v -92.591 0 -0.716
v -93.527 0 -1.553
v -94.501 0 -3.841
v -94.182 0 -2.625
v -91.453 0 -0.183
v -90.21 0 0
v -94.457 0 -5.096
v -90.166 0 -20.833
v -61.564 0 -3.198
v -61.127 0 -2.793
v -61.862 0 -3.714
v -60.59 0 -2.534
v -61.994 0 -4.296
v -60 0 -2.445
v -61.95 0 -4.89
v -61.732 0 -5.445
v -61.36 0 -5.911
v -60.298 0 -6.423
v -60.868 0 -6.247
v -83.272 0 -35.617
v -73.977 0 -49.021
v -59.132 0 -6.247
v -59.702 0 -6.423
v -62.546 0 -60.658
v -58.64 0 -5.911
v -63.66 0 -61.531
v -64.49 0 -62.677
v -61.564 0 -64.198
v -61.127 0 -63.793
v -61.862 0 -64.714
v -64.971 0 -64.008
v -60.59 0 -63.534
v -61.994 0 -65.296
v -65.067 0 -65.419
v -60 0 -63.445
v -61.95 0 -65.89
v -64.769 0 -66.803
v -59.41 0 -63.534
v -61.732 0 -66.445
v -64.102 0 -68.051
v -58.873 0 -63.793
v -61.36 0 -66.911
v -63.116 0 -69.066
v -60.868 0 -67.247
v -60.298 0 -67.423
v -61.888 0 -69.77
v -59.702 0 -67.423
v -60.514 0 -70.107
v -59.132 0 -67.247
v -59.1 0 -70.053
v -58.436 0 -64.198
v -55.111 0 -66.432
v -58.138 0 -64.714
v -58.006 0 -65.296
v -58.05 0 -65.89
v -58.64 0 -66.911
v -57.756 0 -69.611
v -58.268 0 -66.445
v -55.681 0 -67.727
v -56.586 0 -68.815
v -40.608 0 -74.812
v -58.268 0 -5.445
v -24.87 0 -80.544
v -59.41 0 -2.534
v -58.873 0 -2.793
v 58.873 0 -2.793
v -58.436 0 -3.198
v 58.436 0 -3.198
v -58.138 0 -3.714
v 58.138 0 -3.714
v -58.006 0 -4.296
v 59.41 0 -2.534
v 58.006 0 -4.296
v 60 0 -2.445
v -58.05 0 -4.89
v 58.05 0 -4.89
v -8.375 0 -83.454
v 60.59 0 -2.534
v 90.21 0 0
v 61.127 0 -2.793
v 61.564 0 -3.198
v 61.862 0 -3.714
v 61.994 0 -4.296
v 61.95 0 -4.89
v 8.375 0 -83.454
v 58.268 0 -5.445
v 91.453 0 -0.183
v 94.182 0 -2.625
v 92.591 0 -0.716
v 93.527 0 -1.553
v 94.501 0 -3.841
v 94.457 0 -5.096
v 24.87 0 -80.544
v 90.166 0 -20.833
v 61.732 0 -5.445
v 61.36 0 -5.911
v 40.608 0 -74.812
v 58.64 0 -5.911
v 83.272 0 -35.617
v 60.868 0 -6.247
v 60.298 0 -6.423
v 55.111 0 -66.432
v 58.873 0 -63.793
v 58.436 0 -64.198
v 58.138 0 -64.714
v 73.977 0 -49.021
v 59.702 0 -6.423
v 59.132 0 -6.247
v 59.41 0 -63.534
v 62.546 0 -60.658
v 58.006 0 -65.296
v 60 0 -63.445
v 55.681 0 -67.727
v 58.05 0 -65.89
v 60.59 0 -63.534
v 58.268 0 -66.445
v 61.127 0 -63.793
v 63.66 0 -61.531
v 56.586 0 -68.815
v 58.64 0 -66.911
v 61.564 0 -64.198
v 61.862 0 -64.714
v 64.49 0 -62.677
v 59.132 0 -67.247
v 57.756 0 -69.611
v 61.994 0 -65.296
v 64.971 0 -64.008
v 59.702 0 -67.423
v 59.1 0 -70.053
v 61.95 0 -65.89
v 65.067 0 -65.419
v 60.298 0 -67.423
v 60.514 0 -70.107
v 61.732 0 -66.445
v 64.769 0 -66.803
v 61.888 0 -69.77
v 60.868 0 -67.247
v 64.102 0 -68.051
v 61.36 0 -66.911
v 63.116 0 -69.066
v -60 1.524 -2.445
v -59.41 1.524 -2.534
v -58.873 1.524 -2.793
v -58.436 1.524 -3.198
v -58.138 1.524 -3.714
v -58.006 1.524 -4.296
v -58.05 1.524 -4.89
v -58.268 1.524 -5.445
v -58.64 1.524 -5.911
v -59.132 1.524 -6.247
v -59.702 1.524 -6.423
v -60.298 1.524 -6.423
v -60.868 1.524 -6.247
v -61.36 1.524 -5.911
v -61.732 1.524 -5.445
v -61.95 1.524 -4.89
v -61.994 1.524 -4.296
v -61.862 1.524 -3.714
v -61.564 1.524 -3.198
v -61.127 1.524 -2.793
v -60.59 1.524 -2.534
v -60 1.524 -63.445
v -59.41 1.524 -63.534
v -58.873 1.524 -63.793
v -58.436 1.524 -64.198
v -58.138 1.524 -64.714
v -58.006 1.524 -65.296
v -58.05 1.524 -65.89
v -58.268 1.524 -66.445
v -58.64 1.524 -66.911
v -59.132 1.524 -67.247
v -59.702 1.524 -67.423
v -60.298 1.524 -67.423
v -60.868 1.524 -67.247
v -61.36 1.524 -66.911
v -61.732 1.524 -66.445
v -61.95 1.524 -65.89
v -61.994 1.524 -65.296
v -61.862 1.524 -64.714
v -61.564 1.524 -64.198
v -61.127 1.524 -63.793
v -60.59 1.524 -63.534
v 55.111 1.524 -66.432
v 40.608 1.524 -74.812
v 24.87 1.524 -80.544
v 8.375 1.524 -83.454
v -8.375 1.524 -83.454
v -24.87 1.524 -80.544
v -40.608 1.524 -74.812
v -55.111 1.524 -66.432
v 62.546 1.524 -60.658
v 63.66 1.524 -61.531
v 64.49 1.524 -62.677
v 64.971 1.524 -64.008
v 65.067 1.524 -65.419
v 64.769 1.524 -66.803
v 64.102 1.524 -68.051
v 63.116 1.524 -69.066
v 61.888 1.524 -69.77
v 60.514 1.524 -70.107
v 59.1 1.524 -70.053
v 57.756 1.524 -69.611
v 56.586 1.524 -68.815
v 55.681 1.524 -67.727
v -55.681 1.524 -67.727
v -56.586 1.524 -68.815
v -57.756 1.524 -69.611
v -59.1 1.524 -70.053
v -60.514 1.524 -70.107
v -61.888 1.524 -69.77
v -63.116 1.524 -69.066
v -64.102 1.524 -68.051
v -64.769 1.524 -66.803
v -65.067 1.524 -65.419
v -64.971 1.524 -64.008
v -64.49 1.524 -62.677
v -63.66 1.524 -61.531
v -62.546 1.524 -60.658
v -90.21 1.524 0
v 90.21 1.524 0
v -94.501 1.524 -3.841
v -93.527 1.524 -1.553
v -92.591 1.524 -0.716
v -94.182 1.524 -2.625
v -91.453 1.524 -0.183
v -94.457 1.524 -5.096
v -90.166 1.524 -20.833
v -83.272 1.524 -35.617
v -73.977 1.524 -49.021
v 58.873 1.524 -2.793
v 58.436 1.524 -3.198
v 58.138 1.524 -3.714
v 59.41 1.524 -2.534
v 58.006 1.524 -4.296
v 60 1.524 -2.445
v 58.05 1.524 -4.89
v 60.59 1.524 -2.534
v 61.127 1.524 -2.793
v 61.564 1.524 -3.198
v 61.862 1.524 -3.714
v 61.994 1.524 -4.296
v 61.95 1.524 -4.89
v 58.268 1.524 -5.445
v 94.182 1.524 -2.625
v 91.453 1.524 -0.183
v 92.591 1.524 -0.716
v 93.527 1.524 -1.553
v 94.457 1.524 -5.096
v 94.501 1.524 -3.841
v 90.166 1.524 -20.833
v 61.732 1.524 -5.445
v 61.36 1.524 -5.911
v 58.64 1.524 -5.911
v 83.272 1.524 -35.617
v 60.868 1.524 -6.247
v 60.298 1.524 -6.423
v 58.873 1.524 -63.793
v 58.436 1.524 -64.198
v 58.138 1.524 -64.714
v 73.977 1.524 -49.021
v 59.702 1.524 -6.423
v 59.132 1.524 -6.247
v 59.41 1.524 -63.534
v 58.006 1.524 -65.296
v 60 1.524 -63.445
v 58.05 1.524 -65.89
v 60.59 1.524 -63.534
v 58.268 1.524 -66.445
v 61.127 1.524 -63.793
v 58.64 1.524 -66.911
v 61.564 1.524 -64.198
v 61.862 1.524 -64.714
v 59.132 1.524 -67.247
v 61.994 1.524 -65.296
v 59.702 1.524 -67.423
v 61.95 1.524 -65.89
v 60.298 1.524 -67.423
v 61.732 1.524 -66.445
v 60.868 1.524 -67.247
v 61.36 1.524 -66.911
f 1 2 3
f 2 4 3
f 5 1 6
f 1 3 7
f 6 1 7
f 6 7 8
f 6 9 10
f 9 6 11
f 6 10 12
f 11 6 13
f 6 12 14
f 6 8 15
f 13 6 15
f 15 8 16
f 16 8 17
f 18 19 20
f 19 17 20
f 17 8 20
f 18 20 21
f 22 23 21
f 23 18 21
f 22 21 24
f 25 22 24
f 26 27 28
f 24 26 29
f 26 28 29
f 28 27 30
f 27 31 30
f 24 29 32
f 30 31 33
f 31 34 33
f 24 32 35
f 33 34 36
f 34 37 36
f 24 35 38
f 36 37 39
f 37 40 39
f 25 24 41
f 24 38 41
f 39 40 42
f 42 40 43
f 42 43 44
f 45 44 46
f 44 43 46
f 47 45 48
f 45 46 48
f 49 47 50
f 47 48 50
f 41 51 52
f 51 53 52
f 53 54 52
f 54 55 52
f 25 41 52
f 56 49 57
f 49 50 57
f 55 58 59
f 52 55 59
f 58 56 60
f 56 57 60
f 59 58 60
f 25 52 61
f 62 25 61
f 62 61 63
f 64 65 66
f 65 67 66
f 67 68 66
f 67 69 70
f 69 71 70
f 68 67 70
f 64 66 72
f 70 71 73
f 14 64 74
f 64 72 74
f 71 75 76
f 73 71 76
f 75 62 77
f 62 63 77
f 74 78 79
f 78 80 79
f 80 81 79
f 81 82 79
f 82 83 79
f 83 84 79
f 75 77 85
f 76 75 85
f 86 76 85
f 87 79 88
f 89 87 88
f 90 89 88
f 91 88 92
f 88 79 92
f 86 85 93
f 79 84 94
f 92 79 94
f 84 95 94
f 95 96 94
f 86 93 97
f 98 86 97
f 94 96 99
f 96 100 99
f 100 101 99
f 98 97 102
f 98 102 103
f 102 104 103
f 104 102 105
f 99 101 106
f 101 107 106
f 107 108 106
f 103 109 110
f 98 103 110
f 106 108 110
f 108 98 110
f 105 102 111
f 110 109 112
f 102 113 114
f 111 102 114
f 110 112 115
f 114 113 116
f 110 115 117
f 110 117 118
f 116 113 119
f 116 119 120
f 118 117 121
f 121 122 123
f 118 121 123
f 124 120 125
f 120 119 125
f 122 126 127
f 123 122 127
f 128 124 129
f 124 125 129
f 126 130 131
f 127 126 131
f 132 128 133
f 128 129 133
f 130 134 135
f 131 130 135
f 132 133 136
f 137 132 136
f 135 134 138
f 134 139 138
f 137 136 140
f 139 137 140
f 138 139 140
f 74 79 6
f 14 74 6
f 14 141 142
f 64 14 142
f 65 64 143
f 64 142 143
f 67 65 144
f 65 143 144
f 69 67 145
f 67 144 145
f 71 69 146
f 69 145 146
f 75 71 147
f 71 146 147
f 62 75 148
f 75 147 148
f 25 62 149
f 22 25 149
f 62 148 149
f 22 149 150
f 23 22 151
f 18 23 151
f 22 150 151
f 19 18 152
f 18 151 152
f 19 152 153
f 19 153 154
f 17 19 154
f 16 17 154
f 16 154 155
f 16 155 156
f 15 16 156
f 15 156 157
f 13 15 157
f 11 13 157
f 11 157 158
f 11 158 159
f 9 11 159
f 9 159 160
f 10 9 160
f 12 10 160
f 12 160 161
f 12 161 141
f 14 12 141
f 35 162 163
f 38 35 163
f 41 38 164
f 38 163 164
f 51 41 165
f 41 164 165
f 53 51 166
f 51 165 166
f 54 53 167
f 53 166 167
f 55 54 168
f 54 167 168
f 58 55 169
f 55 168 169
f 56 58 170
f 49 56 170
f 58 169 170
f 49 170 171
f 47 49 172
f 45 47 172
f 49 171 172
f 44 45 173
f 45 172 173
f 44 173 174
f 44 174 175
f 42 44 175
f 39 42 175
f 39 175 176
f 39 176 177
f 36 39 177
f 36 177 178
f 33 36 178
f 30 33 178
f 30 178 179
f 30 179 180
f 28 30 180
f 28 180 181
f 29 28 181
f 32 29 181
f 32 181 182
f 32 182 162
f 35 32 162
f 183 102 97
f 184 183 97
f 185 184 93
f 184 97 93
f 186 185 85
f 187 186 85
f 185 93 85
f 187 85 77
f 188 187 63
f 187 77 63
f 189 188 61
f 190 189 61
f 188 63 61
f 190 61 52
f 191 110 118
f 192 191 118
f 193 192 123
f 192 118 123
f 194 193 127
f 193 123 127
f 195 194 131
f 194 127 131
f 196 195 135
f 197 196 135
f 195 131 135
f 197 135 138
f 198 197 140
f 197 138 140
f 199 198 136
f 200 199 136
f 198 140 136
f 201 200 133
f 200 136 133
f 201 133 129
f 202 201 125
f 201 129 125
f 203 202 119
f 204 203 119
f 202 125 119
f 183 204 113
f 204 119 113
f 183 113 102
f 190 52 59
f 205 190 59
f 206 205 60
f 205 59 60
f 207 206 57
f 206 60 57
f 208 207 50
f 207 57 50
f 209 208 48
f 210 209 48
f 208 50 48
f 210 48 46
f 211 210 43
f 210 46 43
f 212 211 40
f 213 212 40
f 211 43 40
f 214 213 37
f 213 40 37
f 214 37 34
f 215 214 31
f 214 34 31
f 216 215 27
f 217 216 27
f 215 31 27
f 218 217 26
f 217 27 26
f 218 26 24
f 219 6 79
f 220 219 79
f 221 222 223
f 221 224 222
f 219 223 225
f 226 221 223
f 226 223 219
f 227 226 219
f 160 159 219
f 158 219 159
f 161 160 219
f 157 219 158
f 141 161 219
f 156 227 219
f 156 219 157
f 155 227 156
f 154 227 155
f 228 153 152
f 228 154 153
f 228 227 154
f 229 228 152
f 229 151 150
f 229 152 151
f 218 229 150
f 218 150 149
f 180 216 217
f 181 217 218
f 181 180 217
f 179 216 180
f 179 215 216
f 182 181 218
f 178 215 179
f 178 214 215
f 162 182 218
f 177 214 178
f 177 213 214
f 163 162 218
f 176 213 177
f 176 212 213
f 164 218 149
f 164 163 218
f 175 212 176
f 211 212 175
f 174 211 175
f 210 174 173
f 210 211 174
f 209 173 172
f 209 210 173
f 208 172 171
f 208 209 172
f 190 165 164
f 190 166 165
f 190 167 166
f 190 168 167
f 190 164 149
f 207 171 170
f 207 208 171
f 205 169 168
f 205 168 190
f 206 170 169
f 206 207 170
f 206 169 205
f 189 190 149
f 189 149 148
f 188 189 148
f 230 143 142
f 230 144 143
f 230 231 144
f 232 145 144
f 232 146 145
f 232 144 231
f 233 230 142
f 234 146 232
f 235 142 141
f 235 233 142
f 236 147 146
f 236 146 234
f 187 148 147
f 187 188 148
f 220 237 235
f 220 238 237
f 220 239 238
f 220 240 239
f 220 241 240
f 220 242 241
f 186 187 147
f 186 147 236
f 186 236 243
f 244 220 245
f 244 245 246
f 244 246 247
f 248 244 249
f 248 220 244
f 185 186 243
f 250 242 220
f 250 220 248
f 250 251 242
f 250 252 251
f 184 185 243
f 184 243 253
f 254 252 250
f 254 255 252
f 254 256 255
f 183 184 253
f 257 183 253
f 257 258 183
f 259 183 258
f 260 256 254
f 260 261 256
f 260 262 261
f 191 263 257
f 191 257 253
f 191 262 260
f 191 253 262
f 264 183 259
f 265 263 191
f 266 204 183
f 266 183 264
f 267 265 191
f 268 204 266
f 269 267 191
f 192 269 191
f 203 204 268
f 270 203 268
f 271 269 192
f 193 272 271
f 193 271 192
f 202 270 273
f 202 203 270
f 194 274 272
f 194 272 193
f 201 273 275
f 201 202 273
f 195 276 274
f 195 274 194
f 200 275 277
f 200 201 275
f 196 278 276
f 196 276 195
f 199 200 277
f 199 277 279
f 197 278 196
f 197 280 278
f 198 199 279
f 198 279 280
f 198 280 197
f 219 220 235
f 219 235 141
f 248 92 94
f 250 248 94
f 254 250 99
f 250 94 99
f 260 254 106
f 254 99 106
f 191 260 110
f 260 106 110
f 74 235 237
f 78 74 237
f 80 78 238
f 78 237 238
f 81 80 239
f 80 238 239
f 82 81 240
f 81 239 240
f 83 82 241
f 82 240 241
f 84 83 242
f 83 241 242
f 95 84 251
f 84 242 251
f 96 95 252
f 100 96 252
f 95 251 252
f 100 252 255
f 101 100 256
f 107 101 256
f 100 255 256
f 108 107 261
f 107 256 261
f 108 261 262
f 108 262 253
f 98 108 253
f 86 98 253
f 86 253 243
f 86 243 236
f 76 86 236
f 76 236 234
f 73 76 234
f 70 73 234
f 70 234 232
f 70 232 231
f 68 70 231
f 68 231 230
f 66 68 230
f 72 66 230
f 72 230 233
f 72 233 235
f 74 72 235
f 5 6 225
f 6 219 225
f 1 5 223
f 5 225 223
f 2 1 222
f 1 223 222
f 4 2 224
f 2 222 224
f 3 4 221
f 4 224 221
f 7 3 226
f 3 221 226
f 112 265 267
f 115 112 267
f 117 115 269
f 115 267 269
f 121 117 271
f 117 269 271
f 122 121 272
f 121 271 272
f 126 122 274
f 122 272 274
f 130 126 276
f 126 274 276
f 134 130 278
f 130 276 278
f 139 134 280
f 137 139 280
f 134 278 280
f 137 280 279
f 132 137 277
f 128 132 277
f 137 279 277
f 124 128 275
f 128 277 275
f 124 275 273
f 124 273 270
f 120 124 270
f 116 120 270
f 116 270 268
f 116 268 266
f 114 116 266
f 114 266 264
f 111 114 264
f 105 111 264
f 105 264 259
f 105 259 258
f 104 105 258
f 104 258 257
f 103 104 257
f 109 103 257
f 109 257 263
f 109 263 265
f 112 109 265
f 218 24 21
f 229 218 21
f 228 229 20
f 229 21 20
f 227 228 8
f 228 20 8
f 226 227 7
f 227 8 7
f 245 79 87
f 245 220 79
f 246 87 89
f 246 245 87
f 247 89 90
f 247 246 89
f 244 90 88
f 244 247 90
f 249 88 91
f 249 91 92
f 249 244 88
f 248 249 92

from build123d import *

# Parameters (mm, degrees)
BOSS_EXTRU_1_DEPTH      = 1.524
CONG_1_R                = 4.318
BOSS_EXTRU_3_START      = -1.524
BOSS_EXTRU_3_DEPTH      = 1.524
ESQUISSE3_R             = 2
ENL_V_MAT_EXTRU_1_DEPTH = 127.347243097


with BuildPart() as part:
    # Esquisse1 → Boss.-Extru.1 (new body)
    with BuildSketch(Plane(origin=(0, 0, 0), x_dir=(1, 0, 0), z_dir=(0, 1, 0))):
        with BuildLine():
            Line((-95.25, 0), (95.25, 0))
            ThreePointArc((95.25, 0), (0, 83.82), (-95.25, 0))
        make_face()
    extrude(amount=BOSS_EXTRU_1_DEPTH)

    # Congé1
    cong_1_edges = [part.edges().sort_by_distance(p)[0] for p in [
        (-95.25, 0.762, 0),
        (95.25, 0.762, 0),
    ]]
    fillet(cong_1_edges, radius=CONG_1_R)

    # Esquisse2 → Boss.-Extru.3 (add)
    with BuildSketch(Plane(origin=(0, 1.524, 0), x_dir=(1, 0, 0), z_dir=(0, 1, 0)).offset(BOSS_EXTRU_3_START)):
        with BuildLine():
            ThreePointArc((62.546228877, 60.657678488), (63.115798852, 69.065741324), (55.110603719, 66.431964286))
            ThreePointArc((55.110603719, 66.431964286), (58.899220354, 63.635996718), (62.546228877, 60.657678488))
        make_face()
        with BuildLine():
            ThreePointArc((-62.546228877, 60.657678488), (-58.899220354, 63.635996718), (-55.110603719, 66.431964286))
            ThreePointArc((-55.110603719, 66.431964286), (-63.115798852, 69.065741324), (-62.546228877, 60.657678488))
        make_face()
    extrude(amount=BOSS_EXTRU_3_DEPTH)

    # Esquisse3 → Enlèv. mat.-Extru.1 (cut, through all)
    with BuildSketch(Plane(origin=(0, 1.524, 0), x_dir=(1, 0, 0), z_dir=(0, 1, 0))):
        with Locations(Location((60, 4.445, 0), (0, 0, 270))):
            Circle(ESQUISSE3_R)
        with Locations(Location((-60, 4.445, 0), (0, 0, 270))):
            Circle(ESQUISSE3_R)
        with Locations(Location((-60, 65.445, 0), (0, 0, 270))):
            Circle(ESQUISSE3_R)
        with Locations(Location((60, 65.445, 0), (0, 0, 270))):
            Circle(ESQUISSE3_R)
    extrude(amount=-ENL_V_MAT_EXTRU_1_DEPTH, mode=Mode.SUBTRACT)


solid = part.part
